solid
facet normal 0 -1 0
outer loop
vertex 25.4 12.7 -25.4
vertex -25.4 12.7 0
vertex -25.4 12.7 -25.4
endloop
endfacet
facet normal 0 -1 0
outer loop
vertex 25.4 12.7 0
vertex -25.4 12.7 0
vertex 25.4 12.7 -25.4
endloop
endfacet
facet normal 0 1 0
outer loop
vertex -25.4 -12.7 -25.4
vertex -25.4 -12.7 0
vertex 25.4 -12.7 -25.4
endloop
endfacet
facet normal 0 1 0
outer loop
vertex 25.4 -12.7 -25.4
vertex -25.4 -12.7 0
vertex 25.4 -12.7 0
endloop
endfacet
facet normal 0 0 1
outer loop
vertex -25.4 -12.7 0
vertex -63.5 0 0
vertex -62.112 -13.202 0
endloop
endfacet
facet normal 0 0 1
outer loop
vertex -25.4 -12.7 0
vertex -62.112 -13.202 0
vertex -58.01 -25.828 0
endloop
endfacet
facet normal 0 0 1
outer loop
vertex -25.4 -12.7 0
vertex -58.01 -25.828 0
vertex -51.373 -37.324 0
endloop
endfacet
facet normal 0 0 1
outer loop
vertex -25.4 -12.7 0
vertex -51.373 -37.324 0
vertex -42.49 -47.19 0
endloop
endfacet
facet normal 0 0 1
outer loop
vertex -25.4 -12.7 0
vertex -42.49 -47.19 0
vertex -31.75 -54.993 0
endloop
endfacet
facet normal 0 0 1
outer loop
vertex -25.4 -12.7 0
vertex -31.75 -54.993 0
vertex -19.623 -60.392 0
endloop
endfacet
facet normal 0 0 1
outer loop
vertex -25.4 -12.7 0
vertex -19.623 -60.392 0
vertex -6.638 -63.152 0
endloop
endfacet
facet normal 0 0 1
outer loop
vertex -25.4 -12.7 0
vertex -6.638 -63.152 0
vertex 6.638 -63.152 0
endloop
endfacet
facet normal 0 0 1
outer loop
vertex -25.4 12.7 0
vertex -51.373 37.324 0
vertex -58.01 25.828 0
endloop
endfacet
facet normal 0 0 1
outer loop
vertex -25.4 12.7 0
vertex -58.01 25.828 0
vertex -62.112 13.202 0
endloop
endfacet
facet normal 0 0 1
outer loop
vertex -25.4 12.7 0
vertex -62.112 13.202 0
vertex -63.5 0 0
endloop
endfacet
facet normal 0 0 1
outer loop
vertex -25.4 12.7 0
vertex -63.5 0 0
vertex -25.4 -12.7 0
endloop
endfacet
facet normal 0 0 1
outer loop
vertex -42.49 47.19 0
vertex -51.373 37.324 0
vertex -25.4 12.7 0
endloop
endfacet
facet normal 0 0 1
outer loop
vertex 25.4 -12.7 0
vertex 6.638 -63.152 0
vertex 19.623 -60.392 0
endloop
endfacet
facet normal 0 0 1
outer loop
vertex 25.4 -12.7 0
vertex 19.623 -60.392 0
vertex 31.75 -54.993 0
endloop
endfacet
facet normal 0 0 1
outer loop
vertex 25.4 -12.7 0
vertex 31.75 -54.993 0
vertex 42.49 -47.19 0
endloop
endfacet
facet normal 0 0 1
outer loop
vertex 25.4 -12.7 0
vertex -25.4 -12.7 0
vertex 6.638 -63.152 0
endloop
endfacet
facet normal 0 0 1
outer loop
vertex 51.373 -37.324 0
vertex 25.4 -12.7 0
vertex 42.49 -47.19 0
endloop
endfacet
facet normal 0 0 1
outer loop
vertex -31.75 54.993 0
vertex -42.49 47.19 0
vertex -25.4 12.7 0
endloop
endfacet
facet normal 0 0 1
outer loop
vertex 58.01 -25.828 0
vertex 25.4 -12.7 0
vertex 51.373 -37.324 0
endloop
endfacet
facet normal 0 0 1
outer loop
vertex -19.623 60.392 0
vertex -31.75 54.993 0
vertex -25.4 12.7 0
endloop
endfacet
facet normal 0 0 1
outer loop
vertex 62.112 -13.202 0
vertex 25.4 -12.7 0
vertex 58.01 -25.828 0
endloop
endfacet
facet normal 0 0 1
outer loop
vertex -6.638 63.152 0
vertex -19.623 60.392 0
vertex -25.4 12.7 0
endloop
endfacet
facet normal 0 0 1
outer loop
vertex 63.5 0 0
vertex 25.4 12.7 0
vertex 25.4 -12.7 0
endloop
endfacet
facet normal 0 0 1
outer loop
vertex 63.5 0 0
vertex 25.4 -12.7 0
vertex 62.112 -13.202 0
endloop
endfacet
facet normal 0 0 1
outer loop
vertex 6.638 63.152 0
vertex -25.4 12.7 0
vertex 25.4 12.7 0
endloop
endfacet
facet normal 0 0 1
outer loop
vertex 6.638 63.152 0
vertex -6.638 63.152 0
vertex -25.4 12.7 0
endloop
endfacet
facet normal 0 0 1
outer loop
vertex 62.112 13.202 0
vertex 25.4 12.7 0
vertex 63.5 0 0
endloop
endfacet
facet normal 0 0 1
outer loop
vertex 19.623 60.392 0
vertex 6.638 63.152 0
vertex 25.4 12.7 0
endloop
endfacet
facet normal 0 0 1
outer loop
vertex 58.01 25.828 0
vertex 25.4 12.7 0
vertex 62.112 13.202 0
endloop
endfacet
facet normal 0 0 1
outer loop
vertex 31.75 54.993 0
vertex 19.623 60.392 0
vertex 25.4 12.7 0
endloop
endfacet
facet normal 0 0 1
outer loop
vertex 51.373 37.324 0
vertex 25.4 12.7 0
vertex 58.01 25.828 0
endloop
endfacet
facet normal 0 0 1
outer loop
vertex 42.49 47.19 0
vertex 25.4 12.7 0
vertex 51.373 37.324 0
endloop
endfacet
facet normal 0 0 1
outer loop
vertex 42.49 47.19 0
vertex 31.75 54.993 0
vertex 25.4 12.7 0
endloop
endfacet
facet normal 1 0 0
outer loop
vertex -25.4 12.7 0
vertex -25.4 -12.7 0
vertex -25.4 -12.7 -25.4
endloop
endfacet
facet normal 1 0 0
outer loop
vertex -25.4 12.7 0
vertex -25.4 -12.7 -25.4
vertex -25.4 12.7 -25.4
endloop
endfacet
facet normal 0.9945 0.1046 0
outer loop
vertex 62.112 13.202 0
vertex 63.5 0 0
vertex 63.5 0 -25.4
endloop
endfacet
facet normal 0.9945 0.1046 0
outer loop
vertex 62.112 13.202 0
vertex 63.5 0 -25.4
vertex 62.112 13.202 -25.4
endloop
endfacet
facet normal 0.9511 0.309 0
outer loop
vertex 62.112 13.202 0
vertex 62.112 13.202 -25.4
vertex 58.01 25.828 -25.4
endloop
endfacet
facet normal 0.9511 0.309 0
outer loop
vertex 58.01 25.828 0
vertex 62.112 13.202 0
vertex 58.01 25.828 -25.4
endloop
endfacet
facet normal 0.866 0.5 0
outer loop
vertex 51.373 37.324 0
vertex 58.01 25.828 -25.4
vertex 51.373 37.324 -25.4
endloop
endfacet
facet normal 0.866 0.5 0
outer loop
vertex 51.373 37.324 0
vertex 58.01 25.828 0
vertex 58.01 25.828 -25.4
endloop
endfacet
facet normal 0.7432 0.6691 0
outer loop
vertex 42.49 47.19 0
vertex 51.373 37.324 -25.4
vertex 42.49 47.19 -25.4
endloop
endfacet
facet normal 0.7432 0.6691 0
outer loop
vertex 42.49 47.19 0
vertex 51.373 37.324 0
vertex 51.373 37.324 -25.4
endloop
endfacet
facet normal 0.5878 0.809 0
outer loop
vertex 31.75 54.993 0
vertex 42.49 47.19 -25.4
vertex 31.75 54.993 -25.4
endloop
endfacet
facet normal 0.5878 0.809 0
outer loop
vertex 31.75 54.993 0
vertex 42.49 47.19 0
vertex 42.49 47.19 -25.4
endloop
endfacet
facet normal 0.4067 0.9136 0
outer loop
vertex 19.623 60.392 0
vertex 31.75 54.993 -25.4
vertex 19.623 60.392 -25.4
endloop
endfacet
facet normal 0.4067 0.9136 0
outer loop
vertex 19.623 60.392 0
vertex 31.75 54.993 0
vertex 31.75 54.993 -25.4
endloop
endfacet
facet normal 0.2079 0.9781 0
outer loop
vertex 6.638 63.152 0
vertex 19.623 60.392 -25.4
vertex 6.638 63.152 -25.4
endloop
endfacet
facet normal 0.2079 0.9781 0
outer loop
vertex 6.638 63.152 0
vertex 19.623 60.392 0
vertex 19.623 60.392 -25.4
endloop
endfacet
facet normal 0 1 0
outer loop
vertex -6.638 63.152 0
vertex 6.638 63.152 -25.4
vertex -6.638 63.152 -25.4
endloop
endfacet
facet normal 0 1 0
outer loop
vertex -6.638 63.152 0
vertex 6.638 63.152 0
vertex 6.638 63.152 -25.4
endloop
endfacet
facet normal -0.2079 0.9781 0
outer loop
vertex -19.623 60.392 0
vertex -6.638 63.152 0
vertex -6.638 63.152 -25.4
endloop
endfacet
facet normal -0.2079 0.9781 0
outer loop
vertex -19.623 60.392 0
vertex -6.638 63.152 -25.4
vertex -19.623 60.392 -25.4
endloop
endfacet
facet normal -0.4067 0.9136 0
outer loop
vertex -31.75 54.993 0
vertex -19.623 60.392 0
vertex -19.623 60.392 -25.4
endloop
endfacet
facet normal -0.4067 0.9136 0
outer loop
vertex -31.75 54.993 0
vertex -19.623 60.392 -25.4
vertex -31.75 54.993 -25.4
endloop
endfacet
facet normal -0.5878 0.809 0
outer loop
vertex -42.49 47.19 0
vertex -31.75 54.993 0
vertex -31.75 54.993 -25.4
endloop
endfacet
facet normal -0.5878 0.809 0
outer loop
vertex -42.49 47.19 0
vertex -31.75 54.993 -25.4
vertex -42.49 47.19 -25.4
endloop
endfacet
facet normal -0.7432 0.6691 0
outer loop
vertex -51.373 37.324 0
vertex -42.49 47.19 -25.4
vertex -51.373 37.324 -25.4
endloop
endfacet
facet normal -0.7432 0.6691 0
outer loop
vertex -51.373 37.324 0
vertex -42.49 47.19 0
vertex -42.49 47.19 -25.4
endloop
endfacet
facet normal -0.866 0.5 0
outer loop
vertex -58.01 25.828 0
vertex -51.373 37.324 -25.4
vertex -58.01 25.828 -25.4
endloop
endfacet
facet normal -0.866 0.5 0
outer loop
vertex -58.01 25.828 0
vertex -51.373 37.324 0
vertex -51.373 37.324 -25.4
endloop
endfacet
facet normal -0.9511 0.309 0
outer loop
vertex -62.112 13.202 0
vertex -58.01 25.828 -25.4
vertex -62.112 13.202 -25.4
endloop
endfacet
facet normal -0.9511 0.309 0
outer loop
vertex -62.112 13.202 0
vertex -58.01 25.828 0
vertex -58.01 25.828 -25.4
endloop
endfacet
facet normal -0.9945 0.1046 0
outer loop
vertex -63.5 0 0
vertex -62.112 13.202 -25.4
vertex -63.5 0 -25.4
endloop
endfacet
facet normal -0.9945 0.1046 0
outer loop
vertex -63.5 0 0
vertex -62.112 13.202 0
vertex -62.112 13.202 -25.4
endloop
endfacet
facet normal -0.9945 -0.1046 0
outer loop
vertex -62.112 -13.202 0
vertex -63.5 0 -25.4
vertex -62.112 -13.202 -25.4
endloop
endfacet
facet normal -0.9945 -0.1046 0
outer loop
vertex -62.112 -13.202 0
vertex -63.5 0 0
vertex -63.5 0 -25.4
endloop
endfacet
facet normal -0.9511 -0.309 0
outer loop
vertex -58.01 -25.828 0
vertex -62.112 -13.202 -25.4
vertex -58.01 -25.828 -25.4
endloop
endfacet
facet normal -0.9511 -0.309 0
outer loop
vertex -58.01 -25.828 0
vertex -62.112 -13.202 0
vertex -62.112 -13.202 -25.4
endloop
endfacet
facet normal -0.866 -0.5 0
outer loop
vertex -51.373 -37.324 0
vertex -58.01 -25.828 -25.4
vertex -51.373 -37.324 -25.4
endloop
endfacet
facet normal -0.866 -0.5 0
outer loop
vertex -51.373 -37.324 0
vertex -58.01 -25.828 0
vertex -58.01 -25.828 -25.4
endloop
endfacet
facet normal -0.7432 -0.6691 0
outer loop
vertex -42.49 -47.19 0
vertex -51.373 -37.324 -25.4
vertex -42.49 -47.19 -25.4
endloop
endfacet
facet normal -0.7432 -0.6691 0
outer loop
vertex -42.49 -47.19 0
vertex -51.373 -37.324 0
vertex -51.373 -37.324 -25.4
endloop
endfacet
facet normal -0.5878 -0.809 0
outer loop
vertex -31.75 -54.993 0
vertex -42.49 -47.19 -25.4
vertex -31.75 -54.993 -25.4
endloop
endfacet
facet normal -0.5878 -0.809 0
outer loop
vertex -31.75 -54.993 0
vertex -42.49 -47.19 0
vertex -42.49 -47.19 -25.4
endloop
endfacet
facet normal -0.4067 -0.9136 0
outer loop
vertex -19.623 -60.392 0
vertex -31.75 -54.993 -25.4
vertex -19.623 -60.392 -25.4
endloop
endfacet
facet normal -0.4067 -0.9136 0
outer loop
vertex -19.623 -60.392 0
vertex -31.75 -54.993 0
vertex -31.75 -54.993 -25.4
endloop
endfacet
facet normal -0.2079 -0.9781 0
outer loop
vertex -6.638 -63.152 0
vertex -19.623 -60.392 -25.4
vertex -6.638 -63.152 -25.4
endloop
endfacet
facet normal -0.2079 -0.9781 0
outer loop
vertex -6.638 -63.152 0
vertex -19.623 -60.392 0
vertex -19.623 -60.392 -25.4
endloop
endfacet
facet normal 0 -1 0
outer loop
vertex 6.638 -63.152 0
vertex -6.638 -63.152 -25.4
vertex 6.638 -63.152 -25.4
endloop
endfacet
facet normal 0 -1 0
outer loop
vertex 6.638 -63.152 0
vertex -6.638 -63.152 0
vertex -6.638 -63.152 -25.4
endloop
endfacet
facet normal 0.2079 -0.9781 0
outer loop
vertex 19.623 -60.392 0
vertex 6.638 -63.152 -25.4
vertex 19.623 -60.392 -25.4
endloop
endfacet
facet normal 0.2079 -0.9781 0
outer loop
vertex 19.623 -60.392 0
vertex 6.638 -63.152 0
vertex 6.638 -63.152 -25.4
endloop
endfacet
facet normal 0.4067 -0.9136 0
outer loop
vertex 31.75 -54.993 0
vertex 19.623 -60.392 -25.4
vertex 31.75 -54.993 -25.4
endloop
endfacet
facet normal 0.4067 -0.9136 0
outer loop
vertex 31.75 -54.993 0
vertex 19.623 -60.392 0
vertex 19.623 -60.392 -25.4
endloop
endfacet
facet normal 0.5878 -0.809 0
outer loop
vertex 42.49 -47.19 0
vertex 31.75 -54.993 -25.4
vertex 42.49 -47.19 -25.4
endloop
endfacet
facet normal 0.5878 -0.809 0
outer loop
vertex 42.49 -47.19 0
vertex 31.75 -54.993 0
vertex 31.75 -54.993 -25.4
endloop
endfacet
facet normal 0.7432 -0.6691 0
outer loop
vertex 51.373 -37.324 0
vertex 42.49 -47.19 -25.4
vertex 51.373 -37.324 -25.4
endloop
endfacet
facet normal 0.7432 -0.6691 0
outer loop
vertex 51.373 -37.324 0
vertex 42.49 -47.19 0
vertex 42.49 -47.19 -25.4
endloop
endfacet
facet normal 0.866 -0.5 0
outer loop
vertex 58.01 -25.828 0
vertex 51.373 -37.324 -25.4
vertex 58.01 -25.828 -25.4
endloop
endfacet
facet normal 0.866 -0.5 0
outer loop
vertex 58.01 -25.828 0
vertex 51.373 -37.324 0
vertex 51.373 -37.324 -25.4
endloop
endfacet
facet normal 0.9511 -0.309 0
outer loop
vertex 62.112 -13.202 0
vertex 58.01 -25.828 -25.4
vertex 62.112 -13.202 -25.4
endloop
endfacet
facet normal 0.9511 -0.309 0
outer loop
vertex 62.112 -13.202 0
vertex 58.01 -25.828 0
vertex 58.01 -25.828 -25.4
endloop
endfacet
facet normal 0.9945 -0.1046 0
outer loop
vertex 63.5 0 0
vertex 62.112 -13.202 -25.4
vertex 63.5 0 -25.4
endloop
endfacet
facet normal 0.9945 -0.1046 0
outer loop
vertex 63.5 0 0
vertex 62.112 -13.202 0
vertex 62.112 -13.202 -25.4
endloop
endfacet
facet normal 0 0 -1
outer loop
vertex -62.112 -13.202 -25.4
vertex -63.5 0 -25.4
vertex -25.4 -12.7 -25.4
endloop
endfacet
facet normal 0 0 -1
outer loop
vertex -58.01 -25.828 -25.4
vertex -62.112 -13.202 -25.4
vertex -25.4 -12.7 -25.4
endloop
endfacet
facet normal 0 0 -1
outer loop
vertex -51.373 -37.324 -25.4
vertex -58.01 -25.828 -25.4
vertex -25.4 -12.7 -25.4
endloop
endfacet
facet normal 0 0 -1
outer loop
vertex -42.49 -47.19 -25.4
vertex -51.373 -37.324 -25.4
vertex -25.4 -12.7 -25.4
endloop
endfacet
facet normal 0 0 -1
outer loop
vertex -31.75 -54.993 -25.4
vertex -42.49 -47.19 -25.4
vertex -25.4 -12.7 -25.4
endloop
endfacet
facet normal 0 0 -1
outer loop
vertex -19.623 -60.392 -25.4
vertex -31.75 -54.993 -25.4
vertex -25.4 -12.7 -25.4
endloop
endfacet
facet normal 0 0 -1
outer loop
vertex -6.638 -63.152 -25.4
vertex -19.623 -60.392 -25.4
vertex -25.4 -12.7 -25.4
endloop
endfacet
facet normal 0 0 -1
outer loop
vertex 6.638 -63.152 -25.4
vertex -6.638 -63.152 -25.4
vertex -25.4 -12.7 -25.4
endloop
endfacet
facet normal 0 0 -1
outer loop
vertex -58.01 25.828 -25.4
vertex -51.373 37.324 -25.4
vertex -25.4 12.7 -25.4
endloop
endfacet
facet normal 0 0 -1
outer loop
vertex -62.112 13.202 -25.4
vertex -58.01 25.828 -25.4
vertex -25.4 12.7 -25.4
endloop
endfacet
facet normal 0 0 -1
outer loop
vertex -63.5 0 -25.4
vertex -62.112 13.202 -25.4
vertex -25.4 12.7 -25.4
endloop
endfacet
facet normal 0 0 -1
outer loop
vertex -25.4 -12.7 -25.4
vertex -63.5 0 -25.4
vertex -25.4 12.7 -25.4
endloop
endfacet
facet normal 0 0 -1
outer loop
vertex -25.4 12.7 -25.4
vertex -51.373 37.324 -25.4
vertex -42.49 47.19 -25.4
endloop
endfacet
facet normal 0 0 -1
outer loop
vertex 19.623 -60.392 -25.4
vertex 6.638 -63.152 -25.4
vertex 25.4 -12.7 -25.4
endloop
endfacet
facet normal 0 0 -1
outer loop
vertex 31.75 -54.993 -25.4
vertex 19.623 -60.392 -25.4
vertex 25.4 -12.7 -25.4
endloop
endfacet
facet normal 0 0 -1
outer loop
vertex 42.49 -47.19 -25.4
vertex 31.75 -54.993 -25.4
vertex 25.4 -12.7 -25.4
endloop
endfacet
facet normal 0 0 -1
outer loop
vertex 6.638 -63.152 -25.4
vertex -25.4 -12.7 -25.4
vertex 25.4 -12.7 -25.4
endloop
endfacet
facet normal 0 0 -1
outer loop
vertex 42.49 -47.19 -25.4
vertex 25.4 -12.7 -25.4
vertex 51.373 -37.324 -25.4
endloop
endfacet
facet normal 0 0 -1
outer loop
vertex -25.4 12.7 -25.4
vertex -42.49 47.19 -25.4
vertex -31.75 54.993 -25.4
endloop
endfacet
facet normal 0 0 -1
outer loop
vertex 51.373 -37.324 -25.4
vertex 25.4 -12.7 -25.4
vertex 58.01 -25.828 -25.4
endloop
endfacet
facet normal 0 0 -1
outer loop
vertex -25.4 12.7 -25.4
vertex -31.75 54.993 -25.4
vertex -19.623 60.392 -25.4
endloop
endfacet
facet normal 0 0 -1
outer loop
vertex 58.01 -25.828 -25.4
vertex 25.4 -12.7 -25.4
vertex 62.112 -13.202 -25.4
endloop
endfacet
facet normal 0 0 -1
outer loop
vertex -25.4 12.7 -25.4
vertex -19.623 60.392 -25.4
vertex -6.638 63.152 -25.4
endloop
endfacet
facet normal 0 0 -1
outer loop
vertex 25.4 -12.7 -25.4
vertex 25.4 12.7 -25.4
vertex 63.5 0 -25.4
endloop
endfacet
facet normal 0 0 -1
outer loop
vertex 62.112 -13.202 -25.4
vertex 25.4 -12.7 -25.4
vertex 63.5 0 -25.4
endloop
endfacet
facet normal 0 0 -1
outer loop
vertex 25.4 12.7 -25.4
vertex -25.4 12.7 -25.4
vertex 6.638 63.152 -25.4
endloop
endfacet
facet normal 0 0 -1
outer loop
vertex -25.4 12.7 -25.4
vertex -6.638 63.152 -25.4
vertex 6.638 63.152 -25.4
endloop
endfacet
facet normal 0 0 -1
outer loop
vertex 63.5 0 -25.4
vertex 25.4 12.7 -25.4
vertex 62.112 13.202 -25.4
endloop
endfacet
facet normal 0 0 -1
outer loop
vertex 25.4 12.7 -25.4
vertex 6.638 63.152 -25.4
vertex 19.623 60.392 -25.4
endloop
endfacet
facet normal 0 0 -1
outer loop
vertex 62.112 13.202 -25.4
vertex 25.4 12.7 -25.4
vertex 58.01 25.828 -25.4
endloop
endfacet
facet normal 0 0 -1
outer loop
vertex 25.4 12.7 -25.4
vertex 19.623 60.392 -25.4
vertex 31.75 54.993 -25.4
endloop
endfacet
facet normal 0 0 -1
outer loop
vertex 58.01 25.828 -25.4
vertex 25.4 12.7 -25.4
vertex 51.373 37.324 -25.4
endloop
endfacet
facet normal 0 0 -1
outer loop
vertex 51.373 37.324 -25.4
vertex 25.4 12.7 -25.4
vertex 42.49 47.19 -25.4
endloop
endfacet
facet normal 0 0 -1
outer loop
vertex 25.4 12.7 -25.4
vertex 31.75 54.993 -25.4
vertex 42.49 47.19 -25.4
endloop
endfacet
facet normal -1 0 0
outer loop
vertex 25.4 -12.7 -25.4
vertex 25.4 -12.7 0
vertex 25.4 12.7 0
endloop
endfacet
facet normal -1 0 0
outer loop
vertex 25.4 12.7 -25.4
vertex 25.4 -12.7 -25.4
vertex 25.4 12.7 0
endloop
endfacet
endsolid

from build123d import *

# Parameters (mm, degrees)
F0_R     = 63.5
F1_DEPTH = 25.4
F2_W     = 50.8
F2_H     = 25.4
F3_DEPTH = 25.401


with BuildPart() as f1:
    # F0 (on Top) → F1 (new body)
    with BuildSketch(Plane.XY):
        Circle(F0_R)
    extrude(amount=-F1_DEPTH)

    # F2 (on face) → F3 (cut, through all)
    with BuildSketch(Plane.XY):
        Rectangle(F2_W, F2_H)
    extrude(amount=-F3_DEPTH, mode=Mode.SUBTRACT)


solid = f1.part
